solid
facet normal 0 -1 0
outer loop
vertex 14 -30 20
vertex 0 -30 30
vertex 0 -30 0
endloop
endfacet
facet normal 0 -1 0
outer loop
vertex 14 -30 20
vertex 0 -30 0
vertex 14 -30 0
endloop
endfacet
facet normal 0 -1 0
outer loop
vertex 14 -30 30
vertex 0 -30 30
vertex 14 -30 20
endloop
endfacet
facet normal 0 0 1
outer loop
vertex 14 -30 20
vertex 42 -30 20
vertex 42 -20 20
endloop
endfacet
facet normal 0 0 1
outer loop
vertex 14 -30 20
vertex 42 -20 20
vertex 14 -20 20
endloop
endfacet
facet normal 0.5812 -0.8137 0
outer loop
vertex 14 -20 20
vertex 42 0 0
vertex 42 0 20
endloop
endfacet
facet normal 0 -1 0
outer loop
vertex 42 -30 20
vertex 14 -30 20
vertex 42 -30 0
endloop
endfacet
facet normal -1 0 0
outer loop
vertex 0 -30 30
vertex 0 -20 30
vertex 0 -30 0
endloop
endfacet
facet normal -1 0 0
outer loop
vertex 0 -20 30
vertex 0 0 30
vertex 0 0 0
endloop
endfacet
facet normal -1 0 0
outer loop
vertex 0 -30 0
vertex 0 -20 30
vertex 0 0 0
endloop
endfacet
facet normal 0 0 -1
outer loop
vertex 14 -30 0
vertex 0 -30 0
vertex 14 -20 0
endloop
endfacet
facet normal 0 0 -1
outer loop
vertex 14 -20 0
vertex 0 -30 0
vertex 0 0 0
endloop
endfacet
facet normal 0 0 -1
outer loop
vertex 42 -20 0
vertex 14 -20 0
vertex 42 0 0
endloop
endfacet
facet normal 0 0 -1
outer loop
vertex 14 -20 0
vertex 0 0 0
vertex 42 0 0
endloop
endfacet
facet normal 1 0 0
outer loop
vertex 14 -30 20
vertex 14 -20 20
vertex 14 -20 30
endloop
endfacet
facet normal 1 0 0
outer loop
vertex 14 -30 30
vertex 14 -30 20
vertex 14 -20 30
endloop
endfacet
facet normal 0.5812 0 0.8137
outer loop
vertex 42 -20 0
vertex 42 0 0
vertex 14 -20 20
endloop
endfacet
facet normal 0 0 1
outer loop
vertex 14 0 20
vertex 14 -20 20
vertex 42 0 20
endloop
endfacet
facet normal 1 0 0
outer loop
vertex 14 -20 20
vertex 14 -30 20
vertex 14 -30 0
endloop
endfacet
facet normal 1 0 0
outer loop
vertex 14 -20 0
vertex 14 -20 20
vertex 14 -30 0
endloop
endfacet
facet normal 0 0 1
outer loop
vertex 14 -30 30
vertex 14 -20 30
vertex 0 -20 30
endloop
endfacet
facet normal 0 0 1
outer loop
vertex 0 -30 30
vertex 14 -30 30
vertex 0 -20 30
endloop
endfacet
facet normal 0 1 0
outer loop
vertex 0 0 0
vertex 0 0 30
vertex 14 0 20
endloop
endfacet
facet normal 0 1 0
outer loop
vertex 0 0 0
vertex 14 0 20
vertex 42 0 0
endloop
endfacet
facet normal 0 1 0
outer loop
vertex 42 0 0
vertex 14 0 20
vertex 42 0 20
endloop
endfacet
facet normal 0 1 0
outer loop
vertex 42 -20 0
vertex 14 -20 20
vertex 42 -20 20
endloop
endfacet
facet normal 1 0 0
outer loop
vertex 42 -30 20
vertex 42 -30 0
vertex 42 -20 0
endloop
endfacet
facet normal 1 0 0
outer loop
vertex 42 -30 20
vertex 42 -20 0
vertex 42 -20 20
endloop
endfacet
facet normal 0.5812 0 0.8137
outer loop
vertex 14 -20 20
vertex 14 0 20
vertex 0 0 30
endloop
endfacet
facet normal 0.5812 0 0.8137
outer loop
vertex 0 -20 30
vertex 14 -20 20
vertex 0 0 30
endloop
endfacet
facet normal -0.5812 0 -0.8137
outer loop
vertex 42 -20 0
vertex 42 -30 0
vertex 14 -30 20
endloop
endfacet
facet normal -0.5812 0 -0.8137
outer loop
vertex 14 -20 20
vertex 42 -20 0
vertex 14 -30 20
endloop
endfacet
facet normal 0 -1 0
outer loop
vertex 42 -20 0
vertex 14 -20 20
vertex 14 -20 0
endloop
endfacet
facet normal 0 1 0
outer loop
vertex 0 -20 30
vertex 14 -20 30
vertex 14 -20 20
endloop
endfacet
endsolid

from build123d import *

# Parameters (mm, degrees)
F1_DEPTH = 30
F3_DEPTH = 20
F5_DEPTH = 30.001
F7_DEPTH = 20
F8_DEPTH = 10
F9_DEPTH = 10


with BuildPart() as f1:
    # F0 (on Front) → F1 (new body)
    with BuildSketch(Plane.XZ):
        Polygon((0, 30), (0, 0), (42, 0), (42, 20), (14, 20), (14, 30), align=None)
    extrude(amount=F1_DEPTH)

    # F2 (on face) → F3 (cut)
    with BuildSketch(Plane(origin=(0, 0, 0), x_dir=(-1, 0, 0), z_dir=(0, 1, 0))):
        Polygon((-14, 20), (0, 30), (-14, 30), align=None)
    extrude(amount=-F3_DEPTH, mode=Mode.SUBTRACT)

    # F4 (on face) → F5 (cut, through all)
    with BuildSketch(Plane.XZ.offset(30)):
        Polygon((42, 20), (14, 20), (42, 0), align=None)
    extrude(amount=-F5_DEPTH, mode=Mode.SUBTRACT)

    # F6 (on face) → F7 (join)
    with BuildSketch(Plane(origin=(0, 0, 0), x_dir=(1, 0, 0), z_dir=(0, 0, -1))):
        Polygon((14, 0), (42, 0), (14, 20), align=None)
    extrude(amount=-F7_DEPTH)

    # F4 (on face) → F8 (join)
    with BuildSketch(Plane.XZ.offset(30)):
        Polygon((42, 20), (14, 20), (42, 0), align=None)
    extrude(amount=-F8_DEPTH)

    # F4 (on face) → F9 (cut)
    with BuildSketch(Plane.XZ.offset(30)):
        Polygon((42, 0), (14, 20), (14, 0), align=None)
    extrude(amount=-F9_DEPTH, mode=Mode.SUBTRACT)


solid = f1.part
